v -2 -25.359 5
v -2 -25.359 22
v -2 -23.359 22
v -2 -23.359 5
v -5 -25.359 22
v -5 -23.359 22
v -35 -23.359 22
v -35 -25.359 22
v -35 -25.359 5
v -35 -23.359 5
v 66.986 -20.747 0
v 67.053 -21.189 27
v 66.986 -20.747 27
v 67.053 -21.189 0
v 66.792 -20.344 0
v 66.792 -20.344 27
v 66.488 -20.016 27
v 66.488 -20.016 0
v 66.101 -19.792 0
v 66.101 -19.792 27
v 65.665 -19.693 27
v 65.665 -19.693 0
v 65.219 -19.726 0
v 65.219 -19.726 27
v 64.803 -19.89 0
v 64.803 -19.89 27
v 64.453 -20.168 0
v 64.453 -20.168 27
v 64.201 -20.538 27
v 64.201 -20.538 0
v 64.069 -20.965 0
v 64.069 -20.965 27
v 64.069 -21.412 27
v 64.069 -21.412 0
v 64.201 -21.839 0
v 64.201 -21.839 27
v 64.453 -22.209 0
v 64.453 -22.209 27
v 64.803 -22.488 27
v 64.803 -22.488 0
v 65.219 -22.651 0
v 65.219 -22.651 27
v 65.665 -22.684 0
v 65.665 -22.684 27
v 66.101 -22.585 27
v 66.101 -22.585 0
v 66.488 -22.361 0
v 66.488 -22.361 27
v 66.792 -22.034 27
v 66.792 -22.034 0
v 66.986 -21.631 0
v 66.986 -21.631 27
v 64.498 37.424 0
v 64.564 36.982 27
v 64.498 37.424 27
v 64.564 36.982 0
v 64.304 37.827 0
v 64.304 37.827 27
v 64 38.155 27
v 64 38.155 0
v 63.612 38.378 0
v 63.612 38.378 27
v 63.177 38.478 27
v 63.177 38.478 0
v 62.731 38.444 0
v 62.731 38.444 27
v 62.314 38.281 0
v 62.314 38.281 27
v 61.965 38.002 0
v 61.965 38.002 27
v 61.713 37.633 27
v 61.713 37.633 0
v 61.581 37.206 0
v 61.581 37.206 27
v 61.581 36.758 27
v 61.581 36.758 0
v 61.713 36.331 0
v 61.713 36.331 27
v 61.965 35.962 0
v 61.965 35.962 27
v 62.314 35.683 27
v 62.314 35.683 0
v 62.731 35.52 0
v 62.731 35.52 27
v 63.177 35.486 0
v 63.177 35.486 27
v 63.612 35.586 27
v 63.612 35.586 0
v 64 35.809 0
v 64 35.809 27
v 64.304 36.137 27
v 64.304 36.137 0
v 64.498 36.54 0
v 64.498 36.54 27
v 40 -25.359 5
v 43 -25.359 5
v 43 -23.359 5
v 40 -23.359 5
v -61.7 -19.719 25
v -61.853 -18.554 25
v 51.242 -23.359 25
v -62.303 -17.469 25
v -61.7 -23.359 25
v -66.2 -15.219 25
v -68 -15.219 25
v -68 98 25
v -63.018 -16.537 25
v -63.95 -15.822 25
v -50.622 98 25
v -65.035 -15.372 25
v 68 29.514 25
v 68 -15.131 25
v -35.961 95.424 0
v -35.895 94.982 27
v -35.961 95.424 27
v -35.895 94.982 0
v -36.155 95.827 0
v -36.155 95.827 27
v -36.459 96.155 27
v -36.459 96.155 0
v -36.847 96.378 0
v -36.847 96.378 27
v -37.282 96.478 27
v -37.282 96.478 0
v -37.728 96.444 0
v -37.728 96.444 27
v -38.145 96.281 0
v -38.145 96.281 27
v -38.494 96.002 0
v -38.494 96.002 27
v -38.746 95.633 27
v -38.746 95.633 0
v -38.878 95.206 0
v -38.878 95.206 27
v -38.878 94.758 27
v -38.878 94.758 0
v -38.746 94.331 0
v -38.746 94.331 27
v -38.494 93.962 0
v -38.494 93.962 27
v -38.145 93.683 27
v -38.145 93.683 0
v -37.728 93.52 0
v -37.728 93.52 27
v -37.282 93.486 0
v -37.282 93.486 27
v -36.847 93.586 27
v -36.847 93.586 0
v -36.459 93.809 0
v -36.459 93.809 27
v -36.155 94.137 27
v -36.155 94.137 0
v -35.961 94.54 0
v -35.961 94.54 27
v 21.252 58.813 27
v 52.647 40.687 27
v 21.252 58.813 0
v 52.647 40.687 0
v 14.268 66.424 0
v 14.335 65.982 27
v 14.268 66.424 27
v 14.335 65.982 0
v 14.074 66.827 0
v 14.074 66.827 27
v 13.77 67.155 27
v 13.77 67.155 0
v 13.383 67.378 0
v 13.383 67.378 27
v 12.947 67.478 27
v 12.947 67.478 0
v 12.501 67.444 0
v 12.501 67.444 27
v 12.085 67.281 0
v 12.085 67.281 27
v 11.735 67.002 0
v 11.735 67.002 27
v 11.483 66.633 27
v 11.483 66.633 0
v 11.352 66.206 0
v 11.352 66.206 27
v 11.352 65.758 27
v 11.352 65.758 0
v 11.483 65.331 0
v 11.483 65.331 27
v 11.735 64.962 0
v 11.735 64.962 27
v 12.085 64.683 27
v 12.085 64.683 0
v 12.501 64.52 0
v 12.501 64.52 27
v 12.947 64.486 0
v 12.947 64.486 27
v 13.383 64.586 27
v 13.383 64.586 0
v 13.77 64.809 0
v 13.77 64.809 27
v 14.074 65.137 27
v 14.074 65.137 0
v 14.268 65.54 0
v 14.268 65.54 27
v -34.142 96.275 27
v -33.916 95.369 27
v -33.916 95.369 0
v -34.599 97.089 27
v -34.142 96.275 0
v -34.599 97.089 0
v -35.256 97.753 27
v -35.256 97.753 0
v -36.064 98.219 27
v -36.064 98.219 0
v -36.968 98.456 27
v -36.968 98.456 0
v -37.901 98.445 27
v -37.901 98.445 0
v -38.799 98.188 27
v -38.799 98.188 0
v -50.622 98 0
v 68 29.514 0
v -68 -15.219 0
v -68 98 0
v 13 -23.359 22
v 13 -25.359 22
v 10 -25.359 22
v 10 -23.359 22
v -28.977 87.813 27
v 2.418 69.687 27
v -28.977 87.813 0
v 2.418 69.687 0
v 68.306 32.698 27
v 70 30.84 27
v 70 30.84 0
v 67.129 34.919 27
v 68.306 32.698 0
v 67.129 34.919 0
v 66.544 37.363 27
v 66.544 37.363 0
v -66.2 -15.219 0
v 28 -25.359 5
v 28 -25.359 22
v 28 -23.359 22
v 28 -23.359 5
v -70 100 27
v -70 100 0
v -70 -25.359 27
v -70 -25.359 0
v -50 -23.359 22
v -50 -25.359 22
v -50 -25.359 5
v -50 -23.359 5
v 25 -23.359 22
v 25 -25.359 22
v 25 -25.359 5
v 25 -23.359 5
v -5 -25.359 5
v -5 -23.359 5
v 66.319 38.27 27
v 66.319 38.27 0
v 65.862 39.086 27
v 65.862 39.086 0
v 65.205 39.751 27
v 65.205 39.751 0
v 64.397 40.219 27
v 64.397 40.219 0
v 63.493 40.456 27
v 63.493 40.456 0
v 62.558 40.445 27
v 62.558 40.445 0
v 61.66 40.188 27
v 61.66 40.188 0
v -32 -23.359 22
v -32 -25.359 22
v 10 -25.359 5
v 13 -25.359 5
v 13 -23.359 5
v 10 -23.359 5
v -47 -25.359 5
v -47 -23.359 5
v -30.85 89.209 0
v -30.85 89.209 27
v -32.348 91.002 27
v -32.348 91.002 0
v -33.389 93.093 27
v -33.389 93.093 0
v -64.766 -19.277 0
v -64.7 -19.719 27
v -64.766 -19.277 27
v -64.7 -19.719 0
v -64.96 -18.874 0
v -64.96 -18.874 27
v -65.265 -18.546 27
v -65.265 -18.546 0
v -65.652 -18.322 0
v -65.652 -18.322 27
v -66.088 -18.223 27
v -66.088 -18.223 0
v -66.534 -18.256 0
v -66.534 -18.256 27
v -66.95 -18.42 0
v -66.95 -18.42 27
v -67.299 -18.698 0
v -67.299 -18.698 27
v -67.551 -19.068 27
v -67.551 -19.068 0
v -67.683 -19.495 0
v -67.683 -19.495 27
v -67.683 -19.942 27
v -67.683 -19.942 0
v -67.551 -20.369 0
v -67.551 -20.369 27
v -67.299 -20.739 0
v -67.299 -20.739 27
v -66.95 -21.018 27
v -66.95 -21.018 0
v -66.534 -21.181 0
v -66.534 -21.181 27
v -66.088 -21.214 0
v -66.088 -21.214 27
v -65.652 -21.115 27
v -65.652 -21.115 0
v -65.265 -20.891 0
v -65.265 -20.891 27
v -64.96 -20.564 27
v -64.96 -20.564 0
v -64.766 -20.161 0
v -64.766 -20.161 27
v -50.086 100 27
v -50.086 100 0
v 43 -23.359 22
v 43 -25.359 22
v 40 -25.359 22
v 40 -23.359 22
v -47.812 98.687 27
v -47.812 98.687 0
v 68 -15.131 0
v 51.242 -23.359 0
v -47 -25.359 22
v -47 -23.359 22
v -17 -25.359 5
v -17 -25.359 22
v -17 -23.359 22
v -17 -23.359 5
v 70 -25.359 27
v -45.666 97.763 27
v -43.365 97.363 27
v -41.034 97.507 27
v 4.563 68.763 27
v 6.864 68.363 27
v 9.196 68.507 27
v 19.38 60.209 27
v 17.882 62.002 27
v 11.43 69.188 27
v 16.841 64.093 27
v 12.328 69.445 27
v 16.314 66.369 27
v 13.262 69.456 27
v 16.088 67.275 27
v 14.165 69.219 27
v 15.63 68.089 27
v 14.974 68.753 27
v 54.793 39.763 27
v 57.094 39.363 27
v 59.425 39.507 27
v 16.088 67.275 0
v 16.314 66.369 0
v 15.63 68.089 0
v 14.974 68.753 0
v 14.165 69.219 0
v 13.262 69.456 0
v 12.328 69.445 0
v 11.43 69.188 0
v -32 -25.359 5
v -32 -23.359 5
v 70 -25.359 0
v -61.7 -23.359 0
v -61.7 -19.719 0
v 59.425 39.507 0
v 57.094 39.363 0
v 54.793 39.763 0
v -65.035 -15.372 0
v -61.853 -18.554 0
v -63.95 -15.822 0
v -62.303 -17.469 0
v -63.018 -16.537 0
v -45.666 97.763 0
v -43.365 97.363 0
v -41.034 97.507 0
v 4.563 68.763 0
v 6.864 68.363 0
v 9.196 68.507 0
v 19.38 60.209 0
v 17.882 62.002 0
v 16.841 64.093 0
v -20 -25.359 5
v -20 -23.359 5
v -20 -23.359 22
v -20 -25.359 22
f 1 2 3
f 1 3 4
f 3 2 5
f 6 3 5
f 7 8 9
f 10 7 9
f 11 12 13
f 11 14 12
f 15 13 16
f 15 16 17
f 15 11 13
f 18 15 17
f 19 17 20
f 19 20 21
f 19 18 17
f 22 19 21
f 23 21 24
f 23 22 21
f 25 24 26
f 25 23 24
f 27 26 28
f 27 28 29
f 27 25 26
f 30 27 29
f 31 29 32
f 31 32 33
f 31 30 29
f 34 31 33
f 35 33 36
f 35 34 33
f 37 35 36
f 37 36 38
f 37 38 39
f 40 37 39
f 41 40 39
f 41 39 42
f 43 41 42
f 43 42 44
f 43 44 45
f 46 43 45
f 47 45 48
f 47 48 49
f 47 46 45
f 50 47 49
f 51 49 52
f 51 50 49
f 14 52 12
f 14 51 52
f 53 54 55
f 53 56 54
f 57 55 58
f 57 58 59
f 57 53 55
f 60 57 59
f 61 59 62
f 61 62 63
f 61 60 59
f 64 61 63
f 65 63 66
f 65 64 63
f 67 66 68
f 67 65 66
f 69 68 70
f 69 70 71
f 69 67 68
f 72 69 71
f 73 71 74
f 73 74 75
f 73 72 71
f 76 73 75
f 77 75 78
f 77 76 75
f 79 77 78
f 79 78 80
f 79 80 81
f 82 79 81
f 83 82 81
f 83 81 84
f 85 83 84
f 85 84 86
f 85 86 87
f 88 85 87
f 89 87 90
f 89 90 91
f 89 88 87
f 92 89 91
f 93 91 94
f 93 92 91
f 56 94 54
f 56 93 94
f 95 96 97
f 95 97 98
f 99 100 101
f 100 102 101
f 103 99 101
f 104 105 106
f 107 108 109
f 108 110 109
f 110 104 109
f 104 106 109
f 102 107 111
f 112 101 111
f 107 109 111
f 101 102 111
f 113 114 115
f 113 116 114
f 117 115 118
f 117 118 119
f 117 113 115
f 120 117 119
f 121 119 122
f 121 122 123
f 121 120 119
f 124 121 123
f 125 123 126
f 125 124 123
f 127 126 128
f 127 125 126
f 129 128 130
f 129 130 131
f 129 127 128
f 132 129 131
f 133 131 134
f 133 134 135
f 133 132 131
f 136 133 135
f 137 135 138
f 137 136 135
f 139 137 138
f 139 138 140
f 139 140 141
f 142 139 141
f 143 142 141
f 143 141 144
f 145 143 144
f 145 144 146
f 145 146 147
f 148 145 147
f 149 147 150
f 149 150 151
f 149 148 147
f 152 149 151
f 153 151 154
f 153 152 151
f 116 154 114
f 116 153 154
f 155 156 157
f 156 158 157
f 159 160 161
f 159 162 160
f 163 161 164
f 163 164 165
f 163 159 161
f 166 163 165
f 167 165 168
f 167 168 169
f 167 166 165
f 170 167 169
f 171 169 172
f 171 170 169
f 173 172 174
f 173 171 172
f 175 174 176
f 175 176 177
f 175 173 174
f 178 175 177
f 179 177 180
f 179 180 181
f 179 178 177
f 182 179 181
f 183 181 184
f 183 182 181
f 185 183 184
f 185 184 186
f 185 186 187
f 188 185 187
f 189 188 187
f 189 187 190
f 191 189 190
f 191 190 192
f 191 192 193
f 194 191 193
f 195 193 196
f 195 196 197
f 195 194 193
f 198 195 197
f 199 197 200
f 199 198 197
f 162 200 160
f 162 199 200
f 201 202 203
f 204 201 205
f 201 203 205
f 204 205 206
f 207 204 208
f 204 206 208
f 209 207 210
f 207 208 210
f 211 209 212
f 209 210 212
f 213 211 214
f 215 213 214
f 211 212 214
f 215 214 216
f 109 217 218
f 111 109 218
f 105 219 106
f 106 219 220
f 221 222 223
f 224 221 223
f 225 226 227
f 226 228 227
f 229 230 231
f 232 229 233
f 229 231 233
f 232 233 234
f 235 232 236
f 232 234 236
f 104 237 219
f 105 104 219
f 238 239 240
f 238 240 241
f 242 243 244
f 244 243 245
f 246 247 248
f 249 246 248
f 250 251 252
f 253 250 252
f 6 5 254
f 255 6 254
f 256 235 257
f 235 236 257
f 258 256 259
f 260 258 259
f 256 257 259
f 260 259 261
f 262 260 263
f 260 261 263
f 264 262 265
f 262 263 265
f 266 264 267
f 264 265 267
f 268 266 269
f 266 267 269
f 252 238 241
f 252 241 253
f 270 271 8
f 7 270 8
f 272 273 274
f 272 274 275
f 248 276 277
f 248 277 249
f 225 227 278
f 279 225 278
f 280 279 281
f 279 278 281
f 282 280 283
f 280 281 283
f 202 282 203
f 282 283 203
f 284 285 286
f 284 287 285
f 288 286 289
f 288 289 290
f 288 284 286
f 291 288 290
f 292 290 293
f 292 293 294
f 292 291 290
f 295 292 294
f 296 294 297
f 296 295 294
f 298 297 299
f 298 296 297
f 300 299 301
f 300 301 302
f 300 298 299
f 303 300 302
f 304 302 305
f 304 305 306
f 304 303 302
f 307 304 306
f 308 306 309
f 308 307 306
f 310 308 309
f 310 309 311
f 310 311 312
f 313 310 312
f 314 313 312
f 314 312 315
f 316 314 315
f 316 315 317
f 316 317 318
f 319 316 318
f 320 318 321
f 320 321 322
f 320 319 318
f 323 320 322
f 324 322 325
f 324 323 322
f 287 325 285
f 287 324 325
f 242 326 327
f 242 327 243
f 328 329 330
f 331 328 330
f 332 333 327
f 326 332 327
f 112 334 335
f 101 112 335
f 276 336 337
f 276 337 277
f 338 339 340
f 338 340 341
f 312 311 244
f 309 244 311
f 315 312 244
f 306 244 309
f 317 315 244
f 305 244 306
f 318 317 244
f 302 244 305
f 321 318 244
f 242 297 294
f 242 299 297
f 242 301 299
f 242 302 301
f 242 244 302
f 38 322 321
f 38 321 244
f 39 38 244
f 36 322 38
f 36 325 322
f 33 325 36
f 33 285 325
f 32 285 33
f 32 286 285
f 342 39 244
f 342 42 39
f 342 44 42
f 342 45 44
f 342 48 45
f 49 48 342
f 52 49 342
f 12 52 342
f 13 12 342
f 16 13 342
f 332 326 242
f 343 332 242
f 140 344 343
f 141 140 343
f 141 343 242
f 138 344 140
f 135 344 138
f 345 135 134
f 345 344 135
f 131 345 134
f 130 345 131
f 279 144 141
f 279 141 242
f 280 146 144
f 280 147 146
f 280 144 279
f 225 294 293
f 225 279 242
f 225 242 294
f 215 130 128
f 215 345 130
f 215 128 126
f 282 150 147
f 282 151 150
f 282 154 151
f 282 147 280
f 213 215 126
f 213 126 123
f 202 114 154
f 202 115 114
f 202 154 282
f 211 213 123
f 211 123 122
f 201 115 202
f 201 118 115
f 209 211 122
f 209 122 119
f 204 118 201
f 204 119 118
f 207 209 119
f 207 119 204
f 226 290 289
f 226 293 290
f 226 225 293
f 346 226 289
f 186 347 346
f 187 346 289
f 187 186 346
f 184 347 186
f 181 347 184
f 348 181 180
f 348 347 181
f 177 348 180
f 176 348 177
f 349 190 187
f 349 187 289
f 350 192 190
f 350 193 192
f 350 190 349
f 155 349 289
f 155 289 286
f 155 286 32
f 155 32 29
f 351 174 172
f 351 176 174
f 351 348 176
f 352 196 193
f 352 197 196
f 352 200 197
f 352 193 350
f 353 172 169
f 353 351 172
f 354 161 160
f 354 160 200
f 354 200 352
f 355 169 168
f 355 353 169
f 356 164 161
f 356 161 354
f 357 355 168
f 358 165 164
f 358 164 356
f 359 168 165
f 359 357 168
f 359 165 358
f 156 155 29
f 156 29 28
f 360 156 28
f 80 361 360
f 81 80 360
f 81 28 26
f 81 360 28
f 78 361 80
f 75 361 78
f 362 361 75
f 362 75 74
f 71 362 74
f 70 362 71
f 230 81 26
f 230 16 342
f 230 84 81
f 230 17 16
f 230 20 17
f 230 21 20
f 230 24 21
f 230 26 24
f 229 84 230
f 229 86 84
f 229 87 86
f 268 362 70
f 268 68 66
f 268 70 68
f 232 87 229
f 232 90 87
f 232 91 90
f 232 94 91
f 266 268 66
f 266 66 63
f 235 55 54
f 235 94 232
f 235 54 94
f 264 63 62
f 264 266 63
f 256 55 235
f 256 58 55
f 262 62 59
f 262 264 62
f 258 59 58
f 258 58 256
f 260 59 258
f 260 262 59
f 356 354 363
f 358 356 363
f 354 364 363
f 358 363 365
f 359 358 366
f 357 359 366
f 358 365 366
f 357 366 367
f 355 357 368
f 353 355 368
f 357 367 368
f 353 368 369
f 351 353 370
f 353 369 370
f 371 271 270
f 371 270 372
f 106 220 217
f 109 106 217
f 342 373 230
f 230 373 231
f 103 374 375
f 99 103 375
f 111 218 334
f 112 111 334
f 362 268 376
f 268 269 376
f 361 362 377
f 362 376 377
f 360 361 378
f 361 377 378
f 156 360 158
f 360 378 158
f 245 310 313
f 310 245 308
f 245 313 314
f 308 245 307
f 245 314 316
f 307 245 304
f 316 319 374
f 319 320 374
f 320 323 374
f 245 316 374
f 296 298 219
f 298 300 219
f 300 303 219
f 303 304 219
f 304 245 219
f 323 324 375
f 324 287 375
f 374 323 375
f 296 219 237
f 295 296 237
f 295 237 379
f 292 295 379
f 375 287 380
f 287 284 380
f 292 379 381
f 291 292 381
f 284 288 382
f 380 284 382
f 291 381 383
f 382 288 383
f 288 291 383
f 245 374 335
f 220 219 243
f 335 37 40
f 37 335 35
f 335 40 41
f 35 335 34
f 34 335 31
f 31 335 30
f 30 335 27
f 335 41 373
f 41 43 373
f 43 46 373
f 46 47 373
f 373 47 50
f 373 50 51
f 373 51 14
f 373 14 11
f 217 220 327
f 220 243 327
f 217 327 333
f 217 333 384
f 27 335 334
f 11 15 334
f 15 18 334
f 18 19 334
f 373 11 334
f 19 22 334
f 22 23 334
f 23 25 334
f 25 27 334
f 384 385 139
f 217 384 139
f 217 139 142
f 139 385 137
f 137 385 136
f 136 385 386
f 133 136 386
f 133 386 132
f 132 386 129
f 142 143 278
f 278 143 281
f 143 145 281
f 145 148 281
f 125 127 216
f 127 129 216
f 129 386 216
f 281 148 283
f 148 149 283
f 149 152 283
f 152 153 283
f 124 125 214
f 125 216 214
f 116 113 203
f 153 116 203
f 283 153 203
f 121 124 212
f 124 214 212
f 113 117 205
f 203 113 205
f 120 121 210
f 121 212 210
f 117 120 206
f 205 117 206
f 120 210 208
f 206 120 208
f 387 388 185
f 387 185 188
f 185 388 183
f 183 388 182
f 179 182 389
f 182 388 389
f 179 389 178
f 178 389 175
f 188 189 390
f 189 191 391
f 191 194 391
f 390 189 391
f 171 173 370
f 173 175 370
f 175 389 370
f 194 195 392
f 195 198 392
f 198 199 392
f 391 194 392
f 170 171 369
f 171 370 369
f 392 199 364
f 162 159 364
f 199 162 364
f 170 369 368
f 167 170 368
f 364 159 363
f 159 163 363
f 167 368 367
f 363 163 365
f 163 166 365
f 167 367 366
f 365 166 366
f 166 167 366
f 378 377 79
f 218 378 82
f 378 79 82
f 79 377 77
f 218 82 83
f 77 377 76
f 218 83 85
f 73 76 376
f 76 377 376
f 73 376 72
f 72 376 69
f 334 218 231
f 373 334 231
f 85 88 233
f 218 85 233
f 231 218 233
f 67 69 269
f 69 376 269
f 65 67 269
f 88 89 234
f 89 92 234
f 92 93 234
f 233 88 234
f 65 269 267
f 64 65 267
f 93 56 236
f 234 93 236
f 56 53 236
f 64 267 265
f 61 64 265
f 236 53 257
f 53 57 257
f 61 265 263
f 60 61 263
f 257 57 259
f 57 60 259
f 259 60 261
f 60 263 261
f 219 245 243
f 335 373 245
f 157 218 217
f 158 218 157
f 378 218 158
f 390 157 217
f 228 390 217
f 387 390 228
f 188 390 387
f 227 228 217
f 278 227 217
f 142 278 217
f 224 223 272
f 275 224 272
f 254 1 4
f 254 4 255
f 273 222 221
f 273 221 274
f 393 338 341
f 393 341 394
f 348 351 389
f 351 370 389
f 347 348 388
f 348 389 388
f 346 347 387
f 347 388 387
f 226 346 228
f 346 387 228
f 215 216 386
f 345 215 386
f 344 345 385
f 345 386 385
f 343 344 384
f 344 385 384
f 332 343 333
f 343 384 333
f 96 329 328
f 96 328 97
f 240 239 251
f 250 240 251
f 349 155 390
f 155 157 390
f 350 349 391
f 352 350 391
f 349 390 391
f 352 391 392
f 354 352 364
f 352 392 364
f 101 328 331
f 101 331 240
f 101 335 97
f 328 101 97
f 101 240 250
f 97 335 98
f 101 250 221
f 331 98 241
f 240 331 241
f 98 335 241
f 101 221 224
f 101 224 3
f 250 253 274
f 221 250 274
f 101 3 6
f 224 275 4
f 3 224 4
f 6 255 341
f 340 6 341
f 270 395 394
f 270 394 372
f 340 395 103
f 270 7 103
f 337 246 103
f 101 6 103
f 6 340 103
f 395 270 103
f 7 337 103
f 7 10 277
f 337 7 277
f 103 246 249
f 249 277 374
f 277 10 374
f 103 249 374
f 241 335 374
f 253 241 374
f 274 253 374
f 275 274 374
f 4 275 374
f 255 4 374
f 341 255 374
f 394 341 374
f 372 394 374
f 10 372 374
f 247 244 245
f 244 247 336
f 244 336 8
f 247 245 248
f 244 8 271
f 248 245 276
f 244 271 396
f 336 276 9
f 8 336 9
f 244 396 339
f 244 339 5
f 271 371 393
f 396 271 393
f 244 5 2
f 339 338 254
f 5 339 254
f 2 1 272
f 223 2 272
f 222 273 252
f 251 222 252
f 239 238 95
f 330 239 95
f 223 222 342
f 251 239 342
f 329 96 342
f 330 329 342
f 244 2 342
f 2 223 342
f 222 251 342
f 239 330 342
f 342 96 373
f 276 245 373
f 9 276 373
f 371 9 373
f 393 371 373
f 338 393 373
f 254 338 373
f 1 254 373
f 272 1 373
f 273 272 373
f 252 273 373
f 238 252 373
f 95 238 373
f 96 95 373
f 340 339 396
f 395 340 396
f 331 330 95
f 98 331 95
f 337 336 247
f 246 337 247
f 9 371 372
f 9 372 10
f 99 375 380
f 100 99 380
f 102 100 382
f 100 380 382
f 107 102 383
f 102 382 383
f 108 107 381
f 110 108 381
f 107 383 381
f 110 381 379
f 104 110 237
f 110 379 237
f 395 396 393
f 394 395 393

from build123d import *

# Parameters (mm, degrees)
SKETCH1_R           = 1.5
BOSS_EXTRUDE1_DEPTH = 25
SKETCH2_R           = 1.5
BOSS_EXTRUDE2_DEPTH = 2
SKETCH3_W           = 3
SKETCH3_H           = 17
CUT_EXTRUDE1_DEPTH  = 2
LPATTERN1_COUNT     = 7
LPATTERN1_PITCH     = 15


with BuildPart() as part:
    # Sketch1 → Boss-Extrude1 (new body)
    with BuildSketch(Plane.XY):
        with BuildLine():
            Line((-50.08587988, 100), (-70, 100))
            Line((-70, 100), (-70, -25.358547654))
            Line((-70, -25.358547654), (70, -25.358547654))
            Line((70, -25.358547654), (70, 30.840200363))
            ThreePointArc((70, 30.840200363), (67.647784394, 33.77119445), (66.543566366, 37.363456571))
            ThreePointArc((66.543566366, 37.363456571), (64.816659948, 40.011839547), (61.659897736, 40.187880739))
            ThreePointArc((61.659897736, 40.187880739), (57.09391383, 39.362702083), (52.647005809, 40.687140793))
            Line((52.647005809, 40.687140793), (21.252340591, 58.812859207))
            ThreePointArc((21.252340591, 58.812859207), (17.881889013, 62.001775167), (16.313522739, 66.368622551))
            ThreePointArc((16.313522739, 66.368622551), (14.584936491, 69.013139721), (11.430424316, 69.187880739))
            ThreePointArc((11.430424316, 69.187880739), (6.864440411, 68.362702083), (2.41753239, 69.687140793))
            Line((2.41753239, 69.687140793), (-28.977132828, 87.812859207))
            ThreePointArc((-28.977132828, 87.812859207), (-32.347584407, 91.001775167), (-33.915950681, 95.368622551))
            ThreePointArc((-33.915950681, 95.368622551), (-35.644536929, 98.013139721), (-38.799049103, 98.187880739))
            ThreePointArc((-38.799049103, 98.187880739), (-43.365033009, 97.362702083), (-47.81194103, 98.687140793))
            Line((-47.81194103, 98.687140793), (-50.08587988, 100))
        make_face()
        with BuildLine():
            Line((-50.621778265, 98), (68, 29.513684387))
            Line((68, 29.513684387), (68, -15.130655325))
            Line((68, -15.130655325), (51.241660417, -23.358547654))
            Line((51.241660417, -23.358547654), (-61.699771159, -23.358547654))
            Line((-61.699771159, -23.358547654), (-61.699771159, -19.718666382))
            ThreePointArc((-61.699771159, -19.718666382), (-63.017790644, -16.536685867), (-66.199771159, -15.218666382))
            Line((-66.199771159, -15.218666382), (-68, -15.218666382))
            Line((-68, -15.218666382), (-68, 98))
            Line((-68, 98), (-50.621778265, 98))
        make_face(mode=Mode.SUBTRACT)
        with Locations((63.06440991, 36.982050808)):
            Circle(SKETCH1_R, mode=Mode.SUBTRACT)
        with Locations((-37.394536929, 94.982050808)):
            Circle(SKETCH1_R, mode=Mode.SUBTRACT)
        with Locations((12.834936491, 65.982050808)):
            Circle(SKETCH1_R, mode=Mode.SUBTRACT)
        with Locations((65.552729719, -21.188668784)):
            Circle(SKETCH1_R, mode=Mode.SUBTRACT)
        with Locations((-66.199771159, -19.718666382)):
            Circle(SKETCH1_R, mode=Mode.SUBTRACT)
    extrude(amount=BOSS_EXTRUDE1_DEPTH)

    # Sketch2 → Boss-Extrude2 (add)
    with BuildSketch(Plane.XY.offset(25)):
        with BuildLine():
            Line((70, -25.358547654), (70, 30.840200363))
            ThreePointArc((70, 30.840200363), (67.647784394, 33.77119445), (66.543566366, 37.363456571))
            ThreePointArc((66.543566366, 37.363456571), (64.816659948, 40.011839547), (61.659897736, 40.187880739))
            ThreePointArc((61.659897736, 40.187880739), (57.09391383, 39.362702083), (52.647005809, 40.687140793))
            Line((52.647005809, 40.687140793), (21.252340591, 58.812859207))
            ThreePointArc((21.252340591, 58.812859207), (17.881889013, 62.001775167), (16.313522739, 66.368622551))
            ThreePointArc((16.313522739, 66.368622551), (14.584936491, 69.013139721), (11.430424316, 69.187880739))
            ThreePointArc((11.430424316, 69.187880739), (6.864440411, 68.362702083), (2.41753239, 69.687140793))
            Line((2.41753239, 69.687140793), (-28.977132828, 87.812859207))
            ThreePointArc((-28.977132828, 87.812859207), (-32.347584407, 91.001775167), (-33.915950681, 95.368622551))
            ThreePointArc((-33.915950681, 95.368622551), (-35.644536929, 98.013139721), (-38.799049103, 98.187880739))
            ThreePointArc((-38.799049103, 98.187880739), (-43.365033009, 97.362702083), (-47.81194103, 98.687140793))
            Line((-47.81194103, 98.687140793), (-50.08587988, 100))
            Line((-50.08587988, 100), (-70, 100))
            Line((-70, 100), (-70, -25.358547654))
            Line((-70, -25.358547654), (70, -25.358547654))
        make_face()
        with Locations((-37.394536929, 94.982050808)):
            Circle(SKETCH2_R, mode=Mode.SUBTRACT)
        with Locations((12.834936491, 65.982050808)):
            Circle(SKETCH2_R, mode=Mode.SUBTRACT)
        with Locations((63.06440991, 36.982050808)):
            Circle(SKETCH2_R, mode=Mode.SUBTRACT)
        with Locations((65.552729719, -21.188668784)):
            Circle(SKETCH2_R, mode=Mode.SUBTRACT)
        with Locations((-66.199771159, -19.718666382)):
            Circle(SKETCH2_R, mode=Mode.SUBTRACT)
    extrude(amount=BOSS_EXTRUDE2_DEPTH)

    # Sketch3 → Cut-Extrude1 (cut)
    with BuildSketch(Plane(origin=(0, -25.358547654, 0), x_dir=(-1, 0, 0), z_dir=(0, -1, 0))):
        with Locations((48.5, -13.5)):
            Rectangle(SKETCH3_W, SKETCH3_H)
    cut_extrude1 = extrude(amount=-CUT_EXTRUDE1_DEPTH, mode=Mode.SUBTRACT)

    # LPattern1: Cut-Extrude1 ×7
    with Locations(*[(i * LPATTERN1_PITCH, 0, 0) for i in range(1, LPATTERN1_COUNT)]):
        add(cut_extrude1, mode=Mode.SUBTRACT)


solid = part.part
